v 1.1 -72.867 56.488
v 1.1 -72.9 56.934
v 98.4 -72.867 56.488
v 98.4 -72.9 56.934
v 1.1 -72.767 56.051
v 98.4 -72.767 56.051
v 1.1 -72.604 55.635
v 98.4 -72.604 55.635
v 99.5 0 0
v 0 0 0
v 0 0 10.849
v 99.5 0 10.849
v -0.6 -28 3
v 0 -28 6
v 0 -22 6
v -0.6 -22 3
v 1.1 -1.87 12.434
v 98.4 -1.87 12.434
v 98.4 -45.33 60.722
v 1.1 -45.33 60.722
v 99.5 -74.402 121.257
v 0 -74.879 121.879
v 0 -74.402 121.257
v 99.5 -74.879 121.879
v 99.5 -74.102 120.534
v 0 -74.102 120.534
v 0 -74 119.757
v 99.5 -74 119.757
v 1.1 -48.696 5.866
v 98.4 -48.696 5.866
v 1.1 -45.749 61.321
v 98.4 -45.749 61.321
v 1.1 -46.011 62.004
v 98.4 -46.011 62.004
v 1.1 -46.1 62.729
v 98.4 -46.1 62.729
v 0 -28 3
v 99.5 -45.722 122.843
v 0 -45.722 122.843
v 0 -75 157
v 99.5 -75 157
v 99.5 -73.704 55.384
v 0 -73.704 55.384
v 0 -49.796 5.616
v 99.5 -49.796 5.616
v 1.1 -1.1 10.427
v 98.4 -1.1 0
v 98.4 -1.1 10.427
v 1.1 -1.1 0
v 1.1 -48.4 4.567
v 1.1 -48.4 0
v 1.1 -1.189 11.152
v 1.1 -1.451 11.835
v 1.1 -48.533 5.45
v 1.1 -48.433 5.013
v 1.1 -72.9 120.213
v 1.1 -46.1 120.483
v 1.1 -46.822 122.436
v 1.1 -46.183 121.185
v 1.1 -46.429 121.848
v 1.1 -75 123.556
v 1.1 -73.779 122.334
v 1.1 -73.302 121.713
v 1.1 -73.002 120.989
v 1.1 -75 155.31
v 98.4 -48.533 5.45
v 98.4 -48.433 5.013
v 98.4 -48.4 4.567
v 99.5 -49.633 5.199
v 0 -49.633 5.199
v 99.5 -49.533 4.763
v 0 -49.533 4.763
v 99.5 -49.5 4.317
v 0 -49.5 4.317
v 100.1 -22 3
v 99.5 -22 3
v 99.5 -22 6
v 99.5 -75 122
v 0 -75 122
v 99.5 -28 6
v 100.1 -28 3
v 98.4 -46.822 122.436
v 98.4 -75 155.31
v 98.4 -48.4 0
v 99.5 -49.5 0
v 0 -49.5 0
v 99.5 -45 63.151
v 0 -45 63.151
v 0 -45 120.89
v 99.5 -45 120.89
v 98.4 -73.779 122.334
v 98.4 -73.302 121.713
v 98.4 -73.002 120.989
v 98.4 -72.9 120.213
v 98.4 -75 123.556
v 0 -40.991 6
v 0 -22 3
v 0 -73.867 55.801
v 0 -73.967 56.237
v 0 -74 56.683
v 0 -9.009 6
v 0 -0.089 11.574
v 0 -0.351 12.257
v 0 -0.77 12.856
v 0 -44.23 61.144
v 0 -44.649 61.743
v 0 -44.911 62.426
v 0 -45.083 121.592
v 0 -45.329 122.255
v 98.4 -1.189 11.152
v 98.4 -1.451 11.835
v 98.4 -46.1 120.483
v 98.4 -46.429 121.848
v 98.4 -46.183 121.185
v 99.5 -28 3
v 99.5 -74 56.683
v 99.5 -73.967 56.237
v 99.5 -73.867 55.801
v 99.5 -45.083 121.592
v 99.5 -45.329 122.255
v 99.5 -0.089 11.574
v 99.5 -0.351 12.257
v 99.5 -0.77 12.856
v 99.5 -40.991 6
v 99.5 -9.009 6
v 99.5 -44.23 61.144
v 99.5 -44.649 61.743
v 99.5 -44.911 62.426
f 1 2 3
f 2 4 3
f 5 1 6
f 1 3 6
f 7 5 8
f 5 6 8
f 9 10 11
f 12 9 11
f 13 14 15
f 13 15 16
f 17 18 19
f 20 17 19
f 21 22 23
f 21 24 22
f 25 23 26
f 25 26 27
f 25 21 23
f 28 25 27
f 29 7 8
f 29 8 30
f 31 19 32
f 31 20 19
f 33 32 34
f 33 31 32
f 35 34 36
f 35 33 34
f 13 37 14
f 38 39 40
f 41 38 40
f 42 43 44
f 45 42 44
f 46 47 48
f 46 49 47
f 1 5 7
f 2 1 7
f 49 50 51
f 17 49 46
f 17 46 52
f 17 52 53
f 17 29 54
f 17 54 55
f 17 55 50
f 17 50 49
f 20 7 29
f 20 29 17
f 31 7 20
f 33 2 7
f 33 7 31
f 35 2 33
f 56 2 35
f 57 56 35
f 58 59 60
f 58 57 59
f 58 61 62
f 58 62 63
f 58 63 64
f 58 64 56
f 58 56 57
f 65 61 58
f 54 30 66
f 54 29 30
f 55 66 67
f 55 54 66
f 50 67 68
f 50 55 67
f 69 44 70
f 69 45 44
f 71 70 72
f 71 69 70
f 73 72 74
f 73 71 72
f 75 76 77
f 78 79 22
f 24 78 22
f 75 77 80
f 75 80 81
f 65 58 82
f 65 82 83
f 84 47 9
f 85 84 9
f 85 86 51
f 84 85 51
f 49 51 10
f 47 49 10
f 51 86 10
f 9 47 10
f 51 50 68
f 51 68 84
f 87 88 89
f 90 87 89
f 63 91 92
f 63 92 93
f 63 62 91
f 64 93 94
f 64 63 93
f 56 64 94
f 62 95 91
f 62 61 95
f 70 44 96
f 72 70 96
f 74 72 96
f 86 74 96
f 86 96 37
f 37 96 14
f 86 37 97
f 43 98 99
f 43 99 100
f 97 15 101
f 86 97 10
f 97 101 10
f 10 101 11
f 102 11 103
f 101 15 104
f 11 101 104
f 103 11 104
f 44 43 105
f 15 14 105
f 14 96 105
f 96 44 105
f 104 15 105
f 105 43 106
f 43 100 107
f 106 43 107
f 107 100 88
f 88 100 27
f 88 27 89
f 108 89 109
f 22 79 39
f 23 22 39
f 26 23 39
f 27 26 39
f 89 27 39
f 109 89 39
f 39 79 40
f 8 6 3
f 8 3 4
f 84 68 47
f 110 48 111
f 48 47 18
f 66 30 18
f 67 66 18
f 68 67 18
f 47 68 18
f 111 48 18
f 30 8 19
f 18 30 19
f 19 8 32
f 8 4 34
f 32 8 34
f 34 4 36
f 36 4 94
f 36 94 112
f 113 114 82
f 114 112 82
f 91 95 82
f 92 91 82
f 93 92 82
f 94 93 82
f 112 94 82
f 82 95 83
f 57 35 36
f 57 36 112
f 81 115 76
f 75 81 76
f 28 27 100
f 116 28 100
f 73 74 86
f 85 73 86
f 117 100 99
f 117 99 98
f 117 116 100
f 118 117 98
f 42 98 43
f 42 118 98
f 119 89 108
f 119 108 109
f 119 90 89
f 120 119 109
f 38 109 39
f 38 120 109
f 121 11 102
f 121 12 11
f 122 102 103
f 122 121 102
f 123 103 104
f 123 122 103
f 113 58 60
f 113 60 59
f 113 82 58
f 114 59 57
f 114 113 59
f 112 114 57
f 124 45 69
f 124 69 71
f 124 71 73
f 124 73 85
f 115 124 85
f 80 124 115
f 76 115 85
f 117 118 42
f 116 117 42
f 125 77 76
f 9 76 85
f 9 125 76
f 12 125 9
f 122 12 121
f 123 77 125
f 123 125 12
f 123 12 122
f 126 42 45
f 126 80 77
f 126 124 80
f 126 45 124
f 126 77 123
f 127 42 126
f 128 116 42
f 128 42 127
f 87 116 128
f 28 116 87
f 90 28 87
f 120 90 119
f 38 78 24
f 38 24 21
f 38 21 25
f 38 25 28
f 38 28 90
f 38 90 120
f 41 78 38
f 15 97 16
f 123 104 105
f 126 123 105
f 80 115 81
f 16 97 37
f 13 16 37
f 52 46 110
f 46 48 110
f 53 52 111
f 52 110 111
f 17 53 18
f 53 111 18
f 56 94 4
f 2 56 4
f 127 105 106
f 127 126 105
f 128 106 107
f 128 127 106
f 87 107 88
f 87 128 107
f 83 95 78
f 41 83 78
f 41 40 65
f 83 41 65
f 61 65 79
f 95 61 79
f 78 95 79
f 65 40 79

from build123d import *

# Parameters (mm, degrees)
F1_DEPTH    = 99.5
F2_T        = -1.1
F3_R        = 3
F4_W        = 6
F4_H        = 3
F5_DEPTH    = 1
F6_T4_DEPTH = 31.981320863
F7_W        = 6
F7_H        = 3
F8_DEPTH    = 1
F9_T4_DEPTH = 31.981320863


# Not quite as in the source:
# - a fillet or chamfer that OpenCascade refuses, or shapes differently, is made with other operations: its cross-section is extruded or revolved along the edge and cut away or added


with BuildPart() as f1:
    # F0 (on Right) → F1 (new body)
    with BuildSketch(Plane.YZ):
        Polygon((-49.5, 0), (0, 0), (0, 12), (-45, 62), (-45, 122), (-75, 157), (-75, 122), (-74, 121), (-74, 56), (-49.5, 5), align=None)
    extrude(amount=F1_DEPTH)

    # F2
    f2_openings = [f1.faces().sort_by_distance(p)[0] for p in [
        (49.75, -75, 139.5),
        (49.75, -24.75, 0),
    ]]
    offset(amount=F2_T, openings=f2_openings, kind=Kind.INTERSECTION)

    # F3
    f3_edges = [f1.edges().sort_by_distance(p)[0] for p in [
        (49.75, -74, 121),
        (49.75, -74, 56),
        (49.75, -49.5, 5),
        (49.75, 0, 12),
        (49.75, -45, 62),
        (49.75, -45, 122),
        (49.75, -1.1, 11.57789),
        (49.75, -46.1, 61.57789),
        (49.75, -72.9, 56.250512),
        (49.75, -46.1, 121.593084),
        (49.75, -72.9, 121.455635),
        (49.75, -48.4, 5.250512),
    ]]
    fillet(f3_edges, radius=F3_R)

    # F4 (on face) → F5 (join)
    with BuildSketch(Plane(origin=(0, 0, 0), x_dir=(0, -1, 0), z_dir=(-1, 0, 0))):
        with Locations((25, 4.5)):
            Rectangle(F4_W, F4_H)
    extrude(amount=F5_DEPTH)

    # F6: chamfer of 1 x 5 on 1 edges, made by hand


with BuildPart() as f6_tool2:
    # F6_s3 → F6_t4 (new body)
    with BuildSketch(Plane.XZ.offset(40.9906604315)):
        Polygon((0, 6), (-1, 1), (-1, 6), align=None)
    extrude(amount=-F6_T4_DEPTH)

    split(bisect_by=Plane.YZ, keep=Keep.BOTTOM)


with BuildPart() as f1_1:
    add(f1.part)

    # F6_t1: cut F6_tool2
    add(f6_tool2.part, mode=Mode.SUBTRACT)

    # F7 (on face) → F8 (join)
    with BuildSketch(Plane.YZ.offset(99.5)):
        with Locations((-25, 4.5)):
            Rectangle(F7_W, F7_H)
    extrude(amount=F8_DEPTH)

    # F9: chamfer of 1 x 5 on 1 edges, made by hand


with BuildPart() as f9_tool2:
    # F9_s3 → F9_t4 (new body)
    with BuildSketch(Plane.XZ.offset(9.0093395685)):
        Polygon((99.5, 6), (100.5, 1), (100.5, 6), align=None)
    extrude(amount=F9_T4_DEPTH)

    split(bisect_by=Plane.YZ.offset(99.5), keep=Keep.TOP)


with BuildPart() as f1_2:
    add(f1_1.part)

    # F9_t1: cut F9_tool2
    add(f9_tool2.part, mode=Mode.SUBTRACT)


solid = f1_2.part
